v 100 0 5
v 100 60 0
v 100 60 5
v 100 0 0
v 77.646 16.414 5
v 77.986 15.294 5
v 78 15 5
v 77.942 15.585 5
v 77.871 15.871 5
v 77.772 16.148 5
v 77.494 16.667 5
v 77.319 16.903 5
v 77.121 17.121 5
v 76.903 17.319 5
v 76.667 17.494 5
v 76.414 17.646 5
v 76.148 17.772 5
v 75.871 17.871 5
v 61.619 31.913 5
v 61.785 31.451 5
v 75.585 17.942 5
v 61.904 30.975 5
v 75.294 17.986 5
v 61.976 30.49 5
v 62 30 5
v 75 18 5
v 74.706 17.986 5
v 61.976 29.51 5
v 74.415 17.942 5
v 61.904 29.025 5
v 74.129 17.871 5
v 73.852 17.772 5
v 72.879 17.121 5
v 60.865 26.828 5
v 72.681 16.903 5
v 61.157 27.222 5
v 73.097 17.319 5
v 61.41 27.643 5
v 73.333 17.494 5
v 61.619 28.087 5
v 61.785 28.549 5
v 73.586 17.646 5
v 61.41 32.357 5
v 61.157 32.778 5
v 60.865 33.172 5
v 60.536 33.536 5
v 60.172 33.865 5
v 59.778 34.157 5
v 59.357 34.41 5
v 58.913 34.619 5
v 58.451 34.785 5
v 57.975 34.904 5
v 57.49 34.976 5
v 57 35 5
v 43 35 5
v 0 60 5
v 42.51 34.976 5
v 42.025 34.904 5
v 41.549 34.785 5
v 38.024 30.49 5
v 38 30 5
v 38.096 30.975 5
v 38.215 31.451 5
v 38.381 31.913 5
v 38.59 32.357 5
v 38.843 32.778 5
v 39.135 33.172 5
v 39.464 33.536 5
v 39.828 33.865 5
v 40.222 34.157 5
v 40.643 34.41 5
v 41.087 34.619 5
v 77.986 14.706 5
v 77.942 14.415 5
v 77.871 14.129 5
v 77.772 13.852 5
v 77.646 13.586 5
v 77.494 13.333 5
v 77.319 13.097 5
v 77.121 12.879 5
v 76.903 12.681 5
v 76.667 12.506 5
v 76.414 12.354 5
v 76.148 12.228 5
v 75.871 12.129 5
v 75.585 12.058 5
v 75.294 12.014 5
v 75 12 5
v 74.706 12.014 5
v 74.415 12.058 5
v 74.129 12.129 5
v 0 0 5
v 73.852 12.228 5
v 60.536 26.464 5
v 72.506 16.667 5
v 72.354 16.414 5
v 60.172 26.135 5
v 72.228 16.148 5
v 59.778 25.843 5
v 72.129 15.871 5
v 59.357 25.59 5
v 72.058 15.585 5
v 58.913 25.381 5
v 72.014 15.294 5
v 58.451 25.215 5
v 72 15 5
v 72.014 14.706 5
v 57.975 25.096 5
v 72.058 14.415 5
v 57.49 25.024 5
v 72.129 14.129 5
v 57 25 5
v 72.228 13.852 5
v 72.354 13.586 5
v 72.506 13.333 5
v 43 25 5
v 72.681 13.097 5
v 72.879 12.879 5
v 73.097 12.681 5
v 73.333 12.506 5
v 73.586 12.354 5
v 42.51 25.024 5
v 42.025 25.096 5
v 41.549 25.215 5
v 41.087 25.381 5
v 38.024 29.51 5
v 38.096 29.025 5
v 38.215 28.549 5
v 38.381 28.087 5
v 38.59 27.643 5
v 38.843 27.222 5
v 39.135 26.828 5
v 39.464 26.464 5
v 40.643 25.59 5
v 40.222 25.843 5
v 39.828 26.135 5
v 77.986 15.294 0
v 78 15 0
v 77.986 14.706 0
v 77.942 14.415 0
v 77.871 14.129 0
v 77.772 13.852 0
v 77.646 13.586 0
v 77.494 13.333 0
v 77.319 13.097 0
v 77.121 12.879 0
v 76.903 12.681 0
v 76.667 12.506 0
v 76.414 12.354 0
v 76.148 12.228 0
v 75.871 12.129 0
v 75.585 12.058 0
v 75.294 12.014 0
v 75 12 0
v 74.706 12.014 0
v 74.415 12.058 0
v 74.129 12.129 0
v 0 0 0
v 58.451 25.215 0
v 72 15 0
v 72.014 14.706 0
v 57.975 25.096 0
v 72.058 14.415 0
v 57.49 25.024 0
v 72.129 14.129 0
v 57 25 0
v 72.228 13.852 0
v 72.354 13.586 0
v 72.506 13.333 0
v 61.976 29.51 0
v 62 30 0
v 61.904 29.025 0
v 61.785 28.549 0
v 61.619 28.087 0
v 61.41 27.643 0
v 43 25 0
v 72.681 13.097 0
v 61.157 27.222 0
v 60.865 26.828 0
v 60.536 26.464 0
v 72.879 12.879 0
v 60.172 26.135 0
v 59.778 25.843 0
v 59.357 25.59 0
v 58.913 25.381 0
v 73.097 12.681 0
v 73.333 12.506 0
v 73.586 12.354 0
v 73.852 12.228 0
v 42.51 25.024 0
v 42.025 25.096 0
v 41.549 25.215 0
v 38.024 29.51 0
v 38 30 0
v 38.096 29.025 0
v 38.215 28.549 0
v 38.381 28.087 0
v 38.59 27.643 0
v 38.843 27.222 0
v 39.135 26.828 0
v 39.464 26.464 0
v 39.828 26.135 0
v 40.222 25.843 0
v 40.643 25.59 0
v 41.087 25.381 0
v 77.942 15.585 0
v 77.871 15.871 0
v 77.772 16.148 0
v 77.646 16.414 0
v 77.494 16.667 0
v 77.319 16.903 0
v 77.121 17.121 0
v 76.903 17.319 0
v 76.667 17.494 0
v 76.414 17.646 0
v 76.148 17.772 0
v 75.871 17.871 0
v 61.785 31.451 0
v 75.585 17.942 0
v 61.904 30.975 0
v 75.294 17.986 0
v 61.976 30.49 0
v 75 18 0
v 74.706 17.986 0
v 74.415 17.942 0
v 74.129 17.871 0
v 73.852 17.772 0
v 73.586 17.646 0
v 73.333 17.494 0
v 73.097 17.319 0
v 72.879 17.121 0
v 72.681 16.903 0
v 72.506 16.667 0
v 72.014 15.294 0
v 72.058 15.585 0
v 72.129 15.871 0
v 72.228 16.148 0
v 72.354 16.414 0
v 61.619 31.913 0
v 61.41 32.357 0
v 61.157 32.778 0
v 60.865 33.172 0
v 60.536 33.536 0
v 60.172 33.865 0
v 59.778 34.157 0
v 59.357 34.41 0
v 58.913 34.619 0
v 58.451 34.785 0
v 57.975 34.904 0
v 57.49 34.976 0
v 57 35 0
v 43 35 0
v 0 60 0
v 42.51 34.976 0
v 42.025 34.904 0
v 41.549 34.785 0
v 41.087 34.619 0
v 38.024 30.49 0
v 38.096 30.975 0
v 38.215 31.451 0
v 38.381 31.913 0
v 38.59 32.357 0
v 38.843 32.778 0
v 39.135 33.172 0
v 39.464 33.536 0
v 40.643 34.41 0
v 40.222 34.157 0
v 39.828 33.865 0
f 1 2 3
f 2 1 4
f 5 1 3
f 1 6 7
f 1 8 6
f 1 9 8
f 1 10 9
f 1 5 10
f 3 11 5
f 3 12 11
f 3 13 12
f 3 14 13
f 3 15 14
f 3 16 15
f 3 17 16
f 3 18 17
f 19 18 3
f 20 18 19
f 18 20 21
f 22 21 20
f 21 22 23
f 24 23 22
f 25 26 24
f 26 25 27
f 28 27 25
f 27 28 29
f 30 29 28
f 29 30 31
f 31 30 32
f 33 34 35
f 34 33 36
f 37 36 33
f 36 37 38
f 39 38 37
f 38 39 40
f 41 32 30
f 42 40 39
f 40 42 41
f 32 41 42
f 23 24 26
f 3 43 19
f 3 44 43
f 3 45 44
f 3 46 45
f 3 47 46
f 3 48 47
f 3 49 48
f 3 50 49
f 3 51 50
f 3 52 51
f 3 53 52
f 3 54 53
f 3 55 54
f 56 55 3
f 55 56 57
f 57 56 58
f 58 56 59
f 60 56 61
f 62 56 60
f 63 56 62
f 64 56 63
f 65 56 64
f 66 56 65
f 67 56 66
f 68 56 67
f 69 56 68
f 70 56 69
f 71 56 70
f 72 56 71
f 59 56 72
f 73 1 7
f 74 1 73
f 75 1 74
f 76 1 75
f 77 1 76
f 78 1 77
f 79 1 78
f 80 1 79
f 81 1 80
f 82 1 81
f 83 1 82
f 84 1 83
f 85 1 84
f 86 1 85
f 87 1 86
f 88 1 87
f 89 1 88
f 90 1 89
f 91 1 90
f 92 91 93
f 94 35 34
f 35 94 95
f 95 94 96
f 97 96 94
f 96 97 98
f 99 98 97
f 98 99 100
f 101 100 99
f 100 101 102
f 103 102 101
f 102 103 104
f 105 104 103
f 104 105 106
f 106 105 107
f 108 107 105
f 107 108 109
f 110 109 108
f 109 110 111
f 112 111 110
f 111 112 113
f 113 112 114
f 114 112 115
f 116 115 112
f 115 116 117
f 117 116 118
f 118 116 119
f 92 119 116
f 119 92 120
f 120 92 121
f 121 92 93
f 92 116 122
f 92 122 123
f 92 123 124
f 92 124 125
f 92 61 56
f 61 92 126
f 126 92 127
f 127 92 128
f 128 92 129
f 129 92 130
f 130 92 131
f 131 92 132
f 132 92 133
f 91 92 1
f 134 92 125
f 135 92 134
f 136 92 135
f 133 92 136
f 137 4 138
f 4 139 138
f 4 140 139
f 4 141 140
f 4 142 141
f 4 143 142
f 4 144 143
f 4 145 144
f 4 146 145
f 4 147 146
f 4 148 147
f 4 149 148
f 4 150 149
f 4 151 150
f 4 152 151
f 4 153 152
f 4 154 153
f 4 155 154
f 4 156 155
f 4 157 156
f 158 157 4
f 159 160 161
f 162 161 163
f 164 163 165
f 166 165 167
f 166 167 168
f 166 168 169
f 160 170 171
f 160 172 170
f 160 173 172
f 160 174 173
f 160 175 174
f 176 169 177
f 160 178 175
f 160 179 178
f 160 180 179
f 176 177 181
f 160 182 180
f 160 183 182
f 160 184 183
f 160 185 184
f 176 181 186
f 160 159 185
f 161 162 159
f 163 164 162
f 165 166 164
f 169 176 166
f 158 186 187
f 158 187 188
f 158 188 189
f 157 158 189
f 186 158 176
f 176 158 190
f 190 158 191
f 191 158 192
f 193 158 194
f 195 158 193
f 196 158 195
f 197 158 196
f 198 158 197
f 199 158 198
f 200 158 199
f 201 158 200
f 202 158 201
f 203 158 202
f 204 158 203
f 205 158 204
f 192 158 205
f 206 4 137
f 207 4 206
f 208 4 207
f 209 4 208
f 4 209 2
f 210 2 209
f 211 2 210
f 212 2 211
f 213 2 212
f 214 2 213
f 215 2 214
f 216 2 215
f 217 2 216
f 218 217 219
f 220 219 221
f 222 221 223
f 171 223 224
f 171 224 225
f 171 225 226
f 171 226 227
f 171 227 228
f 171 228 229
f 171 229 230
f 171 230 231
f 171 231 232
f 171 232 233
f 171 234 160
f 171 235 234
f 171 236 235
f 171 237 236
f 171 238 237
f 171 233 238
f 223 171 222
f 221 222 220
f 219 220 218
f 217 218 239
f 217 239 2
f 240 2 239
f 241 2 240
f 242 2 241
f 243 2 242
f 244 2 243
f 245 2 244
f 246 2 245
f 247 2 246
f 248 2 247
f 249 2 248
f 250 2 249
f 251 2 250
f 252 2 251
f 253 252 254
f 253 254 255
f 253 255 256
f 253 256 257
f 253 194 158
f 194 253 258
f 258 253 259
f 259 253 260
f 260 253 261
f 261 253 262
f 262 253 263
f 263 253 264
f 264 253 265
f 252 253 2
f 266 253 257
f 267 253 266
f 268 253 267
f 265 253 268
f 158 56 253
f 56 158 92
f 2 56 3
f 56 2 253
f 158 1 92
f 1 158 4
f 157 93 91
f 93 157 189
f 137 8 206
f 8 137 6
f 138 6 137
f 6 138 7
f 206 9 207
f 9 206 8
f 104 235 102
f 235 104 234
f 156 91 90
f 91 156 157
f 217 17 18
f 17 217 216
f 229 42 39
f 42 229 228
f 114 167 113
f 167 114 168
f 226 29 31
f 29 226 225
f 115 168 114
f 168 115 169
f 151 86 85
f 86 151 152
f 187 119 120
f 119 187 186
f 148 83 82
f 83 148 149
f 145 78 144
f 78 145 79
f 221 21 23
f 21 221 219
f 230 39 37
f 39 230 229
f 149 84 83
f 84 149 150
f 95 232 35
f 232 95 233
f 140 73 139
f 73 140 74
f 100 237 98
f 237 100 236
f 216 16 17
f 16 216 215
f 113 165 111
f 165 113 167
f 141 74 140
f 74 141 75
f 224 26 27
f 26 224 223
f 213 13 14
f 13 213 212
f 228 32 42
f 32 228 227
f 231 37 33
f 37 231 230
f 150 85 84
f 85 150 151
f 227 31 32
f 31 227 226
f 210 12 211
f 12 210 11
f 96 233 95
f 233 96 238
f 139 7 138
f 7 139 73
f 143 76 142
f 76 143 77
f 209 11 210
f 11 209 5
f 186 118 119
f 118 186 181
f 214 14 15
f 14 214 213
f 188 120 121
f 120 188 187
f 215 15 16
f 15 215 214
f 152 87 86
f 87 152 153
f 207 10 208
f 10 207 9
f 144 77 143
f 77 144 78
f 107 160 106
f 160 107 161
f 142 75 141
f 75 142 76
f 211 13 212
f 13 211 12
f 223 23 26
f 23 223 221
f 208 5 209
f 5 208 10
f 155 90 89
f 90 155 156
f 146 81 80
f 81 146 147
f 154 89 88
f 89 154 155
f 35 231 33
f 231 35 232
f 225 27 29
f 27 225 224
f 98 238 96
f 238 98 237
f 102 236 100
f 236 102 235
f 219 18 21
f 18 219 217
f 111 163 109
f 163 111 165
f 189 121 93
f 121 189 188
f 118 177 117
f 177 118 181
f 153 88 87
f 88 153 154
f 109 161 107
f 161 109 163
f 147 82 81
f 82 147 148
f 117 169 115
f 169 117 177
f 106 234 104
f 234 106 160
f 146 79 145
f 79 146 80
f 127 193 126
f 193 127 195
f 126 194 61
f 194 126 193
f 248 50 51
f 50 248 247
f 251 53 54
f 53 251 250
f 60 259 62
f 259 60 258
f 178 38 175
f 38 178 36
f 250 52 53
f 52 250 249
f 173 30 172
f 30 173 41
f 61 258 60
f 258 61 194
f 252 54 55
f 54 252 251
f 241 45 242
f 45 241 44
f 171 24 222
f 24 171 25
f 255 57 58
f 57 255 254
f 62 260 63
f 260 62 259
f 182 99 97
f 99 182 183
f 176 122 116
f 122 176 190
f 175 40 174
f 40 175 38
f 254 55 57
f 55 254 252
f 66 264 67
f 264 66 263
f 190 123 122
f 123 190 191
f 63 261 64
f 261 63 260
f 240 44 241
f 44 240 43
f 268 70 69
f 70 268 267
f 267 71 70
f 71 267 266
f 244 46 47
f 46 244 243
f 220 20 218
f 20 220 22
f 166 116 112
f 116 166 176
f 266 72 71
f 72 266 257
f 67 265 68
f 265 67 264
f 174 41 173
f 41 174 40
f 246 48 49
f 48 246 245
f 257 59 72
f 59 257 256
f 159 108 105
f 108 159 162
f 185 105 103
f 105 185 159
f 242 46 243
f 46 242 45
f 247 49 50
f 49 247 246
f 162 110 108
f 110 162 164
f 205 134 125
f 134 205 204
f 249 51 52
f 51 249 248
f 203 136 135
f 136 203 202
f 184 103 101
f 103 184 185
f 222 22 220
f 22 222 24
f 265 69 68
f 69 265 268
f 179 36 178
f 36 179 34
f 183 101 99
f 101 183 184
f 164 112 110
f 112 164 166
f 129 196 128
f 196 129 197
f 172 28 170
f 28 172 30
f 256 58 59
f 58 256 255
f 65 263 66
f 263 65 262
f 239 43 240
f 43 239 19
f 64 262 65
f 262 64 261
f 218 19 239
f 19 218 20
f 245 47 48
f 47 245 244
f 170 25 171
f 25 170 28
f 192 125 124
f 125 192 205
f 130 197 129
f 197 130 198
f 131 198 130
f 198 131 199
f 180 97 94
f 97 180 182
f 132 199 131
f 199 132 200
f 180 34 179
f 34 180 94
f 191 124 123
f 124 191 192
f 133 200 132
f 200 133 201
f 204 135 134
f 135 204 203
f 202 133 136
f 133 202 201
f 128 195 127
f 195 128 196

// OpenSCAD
// fixture D2 (planted defect): one opening REMOVED (top-left hole gone).
// declared detector: genus (3 -> 2)
// must remain stable: build_success, extents, volume (hole volume is 0.2%)
$fn = 64;
difference() {
  cube([100, 60, 5]);
  translate([75, 15, -1]) cylinder(d = 6, h = 7);
  translate([50, 30, -1])
    linear_extrude(height = 7)
      hull() {
        translate([-(24 - 10) / 2, 0]) circle(d = 10);
        translate([(24 - 10) / 2, 0]) circle(d = 10);
      }
}
